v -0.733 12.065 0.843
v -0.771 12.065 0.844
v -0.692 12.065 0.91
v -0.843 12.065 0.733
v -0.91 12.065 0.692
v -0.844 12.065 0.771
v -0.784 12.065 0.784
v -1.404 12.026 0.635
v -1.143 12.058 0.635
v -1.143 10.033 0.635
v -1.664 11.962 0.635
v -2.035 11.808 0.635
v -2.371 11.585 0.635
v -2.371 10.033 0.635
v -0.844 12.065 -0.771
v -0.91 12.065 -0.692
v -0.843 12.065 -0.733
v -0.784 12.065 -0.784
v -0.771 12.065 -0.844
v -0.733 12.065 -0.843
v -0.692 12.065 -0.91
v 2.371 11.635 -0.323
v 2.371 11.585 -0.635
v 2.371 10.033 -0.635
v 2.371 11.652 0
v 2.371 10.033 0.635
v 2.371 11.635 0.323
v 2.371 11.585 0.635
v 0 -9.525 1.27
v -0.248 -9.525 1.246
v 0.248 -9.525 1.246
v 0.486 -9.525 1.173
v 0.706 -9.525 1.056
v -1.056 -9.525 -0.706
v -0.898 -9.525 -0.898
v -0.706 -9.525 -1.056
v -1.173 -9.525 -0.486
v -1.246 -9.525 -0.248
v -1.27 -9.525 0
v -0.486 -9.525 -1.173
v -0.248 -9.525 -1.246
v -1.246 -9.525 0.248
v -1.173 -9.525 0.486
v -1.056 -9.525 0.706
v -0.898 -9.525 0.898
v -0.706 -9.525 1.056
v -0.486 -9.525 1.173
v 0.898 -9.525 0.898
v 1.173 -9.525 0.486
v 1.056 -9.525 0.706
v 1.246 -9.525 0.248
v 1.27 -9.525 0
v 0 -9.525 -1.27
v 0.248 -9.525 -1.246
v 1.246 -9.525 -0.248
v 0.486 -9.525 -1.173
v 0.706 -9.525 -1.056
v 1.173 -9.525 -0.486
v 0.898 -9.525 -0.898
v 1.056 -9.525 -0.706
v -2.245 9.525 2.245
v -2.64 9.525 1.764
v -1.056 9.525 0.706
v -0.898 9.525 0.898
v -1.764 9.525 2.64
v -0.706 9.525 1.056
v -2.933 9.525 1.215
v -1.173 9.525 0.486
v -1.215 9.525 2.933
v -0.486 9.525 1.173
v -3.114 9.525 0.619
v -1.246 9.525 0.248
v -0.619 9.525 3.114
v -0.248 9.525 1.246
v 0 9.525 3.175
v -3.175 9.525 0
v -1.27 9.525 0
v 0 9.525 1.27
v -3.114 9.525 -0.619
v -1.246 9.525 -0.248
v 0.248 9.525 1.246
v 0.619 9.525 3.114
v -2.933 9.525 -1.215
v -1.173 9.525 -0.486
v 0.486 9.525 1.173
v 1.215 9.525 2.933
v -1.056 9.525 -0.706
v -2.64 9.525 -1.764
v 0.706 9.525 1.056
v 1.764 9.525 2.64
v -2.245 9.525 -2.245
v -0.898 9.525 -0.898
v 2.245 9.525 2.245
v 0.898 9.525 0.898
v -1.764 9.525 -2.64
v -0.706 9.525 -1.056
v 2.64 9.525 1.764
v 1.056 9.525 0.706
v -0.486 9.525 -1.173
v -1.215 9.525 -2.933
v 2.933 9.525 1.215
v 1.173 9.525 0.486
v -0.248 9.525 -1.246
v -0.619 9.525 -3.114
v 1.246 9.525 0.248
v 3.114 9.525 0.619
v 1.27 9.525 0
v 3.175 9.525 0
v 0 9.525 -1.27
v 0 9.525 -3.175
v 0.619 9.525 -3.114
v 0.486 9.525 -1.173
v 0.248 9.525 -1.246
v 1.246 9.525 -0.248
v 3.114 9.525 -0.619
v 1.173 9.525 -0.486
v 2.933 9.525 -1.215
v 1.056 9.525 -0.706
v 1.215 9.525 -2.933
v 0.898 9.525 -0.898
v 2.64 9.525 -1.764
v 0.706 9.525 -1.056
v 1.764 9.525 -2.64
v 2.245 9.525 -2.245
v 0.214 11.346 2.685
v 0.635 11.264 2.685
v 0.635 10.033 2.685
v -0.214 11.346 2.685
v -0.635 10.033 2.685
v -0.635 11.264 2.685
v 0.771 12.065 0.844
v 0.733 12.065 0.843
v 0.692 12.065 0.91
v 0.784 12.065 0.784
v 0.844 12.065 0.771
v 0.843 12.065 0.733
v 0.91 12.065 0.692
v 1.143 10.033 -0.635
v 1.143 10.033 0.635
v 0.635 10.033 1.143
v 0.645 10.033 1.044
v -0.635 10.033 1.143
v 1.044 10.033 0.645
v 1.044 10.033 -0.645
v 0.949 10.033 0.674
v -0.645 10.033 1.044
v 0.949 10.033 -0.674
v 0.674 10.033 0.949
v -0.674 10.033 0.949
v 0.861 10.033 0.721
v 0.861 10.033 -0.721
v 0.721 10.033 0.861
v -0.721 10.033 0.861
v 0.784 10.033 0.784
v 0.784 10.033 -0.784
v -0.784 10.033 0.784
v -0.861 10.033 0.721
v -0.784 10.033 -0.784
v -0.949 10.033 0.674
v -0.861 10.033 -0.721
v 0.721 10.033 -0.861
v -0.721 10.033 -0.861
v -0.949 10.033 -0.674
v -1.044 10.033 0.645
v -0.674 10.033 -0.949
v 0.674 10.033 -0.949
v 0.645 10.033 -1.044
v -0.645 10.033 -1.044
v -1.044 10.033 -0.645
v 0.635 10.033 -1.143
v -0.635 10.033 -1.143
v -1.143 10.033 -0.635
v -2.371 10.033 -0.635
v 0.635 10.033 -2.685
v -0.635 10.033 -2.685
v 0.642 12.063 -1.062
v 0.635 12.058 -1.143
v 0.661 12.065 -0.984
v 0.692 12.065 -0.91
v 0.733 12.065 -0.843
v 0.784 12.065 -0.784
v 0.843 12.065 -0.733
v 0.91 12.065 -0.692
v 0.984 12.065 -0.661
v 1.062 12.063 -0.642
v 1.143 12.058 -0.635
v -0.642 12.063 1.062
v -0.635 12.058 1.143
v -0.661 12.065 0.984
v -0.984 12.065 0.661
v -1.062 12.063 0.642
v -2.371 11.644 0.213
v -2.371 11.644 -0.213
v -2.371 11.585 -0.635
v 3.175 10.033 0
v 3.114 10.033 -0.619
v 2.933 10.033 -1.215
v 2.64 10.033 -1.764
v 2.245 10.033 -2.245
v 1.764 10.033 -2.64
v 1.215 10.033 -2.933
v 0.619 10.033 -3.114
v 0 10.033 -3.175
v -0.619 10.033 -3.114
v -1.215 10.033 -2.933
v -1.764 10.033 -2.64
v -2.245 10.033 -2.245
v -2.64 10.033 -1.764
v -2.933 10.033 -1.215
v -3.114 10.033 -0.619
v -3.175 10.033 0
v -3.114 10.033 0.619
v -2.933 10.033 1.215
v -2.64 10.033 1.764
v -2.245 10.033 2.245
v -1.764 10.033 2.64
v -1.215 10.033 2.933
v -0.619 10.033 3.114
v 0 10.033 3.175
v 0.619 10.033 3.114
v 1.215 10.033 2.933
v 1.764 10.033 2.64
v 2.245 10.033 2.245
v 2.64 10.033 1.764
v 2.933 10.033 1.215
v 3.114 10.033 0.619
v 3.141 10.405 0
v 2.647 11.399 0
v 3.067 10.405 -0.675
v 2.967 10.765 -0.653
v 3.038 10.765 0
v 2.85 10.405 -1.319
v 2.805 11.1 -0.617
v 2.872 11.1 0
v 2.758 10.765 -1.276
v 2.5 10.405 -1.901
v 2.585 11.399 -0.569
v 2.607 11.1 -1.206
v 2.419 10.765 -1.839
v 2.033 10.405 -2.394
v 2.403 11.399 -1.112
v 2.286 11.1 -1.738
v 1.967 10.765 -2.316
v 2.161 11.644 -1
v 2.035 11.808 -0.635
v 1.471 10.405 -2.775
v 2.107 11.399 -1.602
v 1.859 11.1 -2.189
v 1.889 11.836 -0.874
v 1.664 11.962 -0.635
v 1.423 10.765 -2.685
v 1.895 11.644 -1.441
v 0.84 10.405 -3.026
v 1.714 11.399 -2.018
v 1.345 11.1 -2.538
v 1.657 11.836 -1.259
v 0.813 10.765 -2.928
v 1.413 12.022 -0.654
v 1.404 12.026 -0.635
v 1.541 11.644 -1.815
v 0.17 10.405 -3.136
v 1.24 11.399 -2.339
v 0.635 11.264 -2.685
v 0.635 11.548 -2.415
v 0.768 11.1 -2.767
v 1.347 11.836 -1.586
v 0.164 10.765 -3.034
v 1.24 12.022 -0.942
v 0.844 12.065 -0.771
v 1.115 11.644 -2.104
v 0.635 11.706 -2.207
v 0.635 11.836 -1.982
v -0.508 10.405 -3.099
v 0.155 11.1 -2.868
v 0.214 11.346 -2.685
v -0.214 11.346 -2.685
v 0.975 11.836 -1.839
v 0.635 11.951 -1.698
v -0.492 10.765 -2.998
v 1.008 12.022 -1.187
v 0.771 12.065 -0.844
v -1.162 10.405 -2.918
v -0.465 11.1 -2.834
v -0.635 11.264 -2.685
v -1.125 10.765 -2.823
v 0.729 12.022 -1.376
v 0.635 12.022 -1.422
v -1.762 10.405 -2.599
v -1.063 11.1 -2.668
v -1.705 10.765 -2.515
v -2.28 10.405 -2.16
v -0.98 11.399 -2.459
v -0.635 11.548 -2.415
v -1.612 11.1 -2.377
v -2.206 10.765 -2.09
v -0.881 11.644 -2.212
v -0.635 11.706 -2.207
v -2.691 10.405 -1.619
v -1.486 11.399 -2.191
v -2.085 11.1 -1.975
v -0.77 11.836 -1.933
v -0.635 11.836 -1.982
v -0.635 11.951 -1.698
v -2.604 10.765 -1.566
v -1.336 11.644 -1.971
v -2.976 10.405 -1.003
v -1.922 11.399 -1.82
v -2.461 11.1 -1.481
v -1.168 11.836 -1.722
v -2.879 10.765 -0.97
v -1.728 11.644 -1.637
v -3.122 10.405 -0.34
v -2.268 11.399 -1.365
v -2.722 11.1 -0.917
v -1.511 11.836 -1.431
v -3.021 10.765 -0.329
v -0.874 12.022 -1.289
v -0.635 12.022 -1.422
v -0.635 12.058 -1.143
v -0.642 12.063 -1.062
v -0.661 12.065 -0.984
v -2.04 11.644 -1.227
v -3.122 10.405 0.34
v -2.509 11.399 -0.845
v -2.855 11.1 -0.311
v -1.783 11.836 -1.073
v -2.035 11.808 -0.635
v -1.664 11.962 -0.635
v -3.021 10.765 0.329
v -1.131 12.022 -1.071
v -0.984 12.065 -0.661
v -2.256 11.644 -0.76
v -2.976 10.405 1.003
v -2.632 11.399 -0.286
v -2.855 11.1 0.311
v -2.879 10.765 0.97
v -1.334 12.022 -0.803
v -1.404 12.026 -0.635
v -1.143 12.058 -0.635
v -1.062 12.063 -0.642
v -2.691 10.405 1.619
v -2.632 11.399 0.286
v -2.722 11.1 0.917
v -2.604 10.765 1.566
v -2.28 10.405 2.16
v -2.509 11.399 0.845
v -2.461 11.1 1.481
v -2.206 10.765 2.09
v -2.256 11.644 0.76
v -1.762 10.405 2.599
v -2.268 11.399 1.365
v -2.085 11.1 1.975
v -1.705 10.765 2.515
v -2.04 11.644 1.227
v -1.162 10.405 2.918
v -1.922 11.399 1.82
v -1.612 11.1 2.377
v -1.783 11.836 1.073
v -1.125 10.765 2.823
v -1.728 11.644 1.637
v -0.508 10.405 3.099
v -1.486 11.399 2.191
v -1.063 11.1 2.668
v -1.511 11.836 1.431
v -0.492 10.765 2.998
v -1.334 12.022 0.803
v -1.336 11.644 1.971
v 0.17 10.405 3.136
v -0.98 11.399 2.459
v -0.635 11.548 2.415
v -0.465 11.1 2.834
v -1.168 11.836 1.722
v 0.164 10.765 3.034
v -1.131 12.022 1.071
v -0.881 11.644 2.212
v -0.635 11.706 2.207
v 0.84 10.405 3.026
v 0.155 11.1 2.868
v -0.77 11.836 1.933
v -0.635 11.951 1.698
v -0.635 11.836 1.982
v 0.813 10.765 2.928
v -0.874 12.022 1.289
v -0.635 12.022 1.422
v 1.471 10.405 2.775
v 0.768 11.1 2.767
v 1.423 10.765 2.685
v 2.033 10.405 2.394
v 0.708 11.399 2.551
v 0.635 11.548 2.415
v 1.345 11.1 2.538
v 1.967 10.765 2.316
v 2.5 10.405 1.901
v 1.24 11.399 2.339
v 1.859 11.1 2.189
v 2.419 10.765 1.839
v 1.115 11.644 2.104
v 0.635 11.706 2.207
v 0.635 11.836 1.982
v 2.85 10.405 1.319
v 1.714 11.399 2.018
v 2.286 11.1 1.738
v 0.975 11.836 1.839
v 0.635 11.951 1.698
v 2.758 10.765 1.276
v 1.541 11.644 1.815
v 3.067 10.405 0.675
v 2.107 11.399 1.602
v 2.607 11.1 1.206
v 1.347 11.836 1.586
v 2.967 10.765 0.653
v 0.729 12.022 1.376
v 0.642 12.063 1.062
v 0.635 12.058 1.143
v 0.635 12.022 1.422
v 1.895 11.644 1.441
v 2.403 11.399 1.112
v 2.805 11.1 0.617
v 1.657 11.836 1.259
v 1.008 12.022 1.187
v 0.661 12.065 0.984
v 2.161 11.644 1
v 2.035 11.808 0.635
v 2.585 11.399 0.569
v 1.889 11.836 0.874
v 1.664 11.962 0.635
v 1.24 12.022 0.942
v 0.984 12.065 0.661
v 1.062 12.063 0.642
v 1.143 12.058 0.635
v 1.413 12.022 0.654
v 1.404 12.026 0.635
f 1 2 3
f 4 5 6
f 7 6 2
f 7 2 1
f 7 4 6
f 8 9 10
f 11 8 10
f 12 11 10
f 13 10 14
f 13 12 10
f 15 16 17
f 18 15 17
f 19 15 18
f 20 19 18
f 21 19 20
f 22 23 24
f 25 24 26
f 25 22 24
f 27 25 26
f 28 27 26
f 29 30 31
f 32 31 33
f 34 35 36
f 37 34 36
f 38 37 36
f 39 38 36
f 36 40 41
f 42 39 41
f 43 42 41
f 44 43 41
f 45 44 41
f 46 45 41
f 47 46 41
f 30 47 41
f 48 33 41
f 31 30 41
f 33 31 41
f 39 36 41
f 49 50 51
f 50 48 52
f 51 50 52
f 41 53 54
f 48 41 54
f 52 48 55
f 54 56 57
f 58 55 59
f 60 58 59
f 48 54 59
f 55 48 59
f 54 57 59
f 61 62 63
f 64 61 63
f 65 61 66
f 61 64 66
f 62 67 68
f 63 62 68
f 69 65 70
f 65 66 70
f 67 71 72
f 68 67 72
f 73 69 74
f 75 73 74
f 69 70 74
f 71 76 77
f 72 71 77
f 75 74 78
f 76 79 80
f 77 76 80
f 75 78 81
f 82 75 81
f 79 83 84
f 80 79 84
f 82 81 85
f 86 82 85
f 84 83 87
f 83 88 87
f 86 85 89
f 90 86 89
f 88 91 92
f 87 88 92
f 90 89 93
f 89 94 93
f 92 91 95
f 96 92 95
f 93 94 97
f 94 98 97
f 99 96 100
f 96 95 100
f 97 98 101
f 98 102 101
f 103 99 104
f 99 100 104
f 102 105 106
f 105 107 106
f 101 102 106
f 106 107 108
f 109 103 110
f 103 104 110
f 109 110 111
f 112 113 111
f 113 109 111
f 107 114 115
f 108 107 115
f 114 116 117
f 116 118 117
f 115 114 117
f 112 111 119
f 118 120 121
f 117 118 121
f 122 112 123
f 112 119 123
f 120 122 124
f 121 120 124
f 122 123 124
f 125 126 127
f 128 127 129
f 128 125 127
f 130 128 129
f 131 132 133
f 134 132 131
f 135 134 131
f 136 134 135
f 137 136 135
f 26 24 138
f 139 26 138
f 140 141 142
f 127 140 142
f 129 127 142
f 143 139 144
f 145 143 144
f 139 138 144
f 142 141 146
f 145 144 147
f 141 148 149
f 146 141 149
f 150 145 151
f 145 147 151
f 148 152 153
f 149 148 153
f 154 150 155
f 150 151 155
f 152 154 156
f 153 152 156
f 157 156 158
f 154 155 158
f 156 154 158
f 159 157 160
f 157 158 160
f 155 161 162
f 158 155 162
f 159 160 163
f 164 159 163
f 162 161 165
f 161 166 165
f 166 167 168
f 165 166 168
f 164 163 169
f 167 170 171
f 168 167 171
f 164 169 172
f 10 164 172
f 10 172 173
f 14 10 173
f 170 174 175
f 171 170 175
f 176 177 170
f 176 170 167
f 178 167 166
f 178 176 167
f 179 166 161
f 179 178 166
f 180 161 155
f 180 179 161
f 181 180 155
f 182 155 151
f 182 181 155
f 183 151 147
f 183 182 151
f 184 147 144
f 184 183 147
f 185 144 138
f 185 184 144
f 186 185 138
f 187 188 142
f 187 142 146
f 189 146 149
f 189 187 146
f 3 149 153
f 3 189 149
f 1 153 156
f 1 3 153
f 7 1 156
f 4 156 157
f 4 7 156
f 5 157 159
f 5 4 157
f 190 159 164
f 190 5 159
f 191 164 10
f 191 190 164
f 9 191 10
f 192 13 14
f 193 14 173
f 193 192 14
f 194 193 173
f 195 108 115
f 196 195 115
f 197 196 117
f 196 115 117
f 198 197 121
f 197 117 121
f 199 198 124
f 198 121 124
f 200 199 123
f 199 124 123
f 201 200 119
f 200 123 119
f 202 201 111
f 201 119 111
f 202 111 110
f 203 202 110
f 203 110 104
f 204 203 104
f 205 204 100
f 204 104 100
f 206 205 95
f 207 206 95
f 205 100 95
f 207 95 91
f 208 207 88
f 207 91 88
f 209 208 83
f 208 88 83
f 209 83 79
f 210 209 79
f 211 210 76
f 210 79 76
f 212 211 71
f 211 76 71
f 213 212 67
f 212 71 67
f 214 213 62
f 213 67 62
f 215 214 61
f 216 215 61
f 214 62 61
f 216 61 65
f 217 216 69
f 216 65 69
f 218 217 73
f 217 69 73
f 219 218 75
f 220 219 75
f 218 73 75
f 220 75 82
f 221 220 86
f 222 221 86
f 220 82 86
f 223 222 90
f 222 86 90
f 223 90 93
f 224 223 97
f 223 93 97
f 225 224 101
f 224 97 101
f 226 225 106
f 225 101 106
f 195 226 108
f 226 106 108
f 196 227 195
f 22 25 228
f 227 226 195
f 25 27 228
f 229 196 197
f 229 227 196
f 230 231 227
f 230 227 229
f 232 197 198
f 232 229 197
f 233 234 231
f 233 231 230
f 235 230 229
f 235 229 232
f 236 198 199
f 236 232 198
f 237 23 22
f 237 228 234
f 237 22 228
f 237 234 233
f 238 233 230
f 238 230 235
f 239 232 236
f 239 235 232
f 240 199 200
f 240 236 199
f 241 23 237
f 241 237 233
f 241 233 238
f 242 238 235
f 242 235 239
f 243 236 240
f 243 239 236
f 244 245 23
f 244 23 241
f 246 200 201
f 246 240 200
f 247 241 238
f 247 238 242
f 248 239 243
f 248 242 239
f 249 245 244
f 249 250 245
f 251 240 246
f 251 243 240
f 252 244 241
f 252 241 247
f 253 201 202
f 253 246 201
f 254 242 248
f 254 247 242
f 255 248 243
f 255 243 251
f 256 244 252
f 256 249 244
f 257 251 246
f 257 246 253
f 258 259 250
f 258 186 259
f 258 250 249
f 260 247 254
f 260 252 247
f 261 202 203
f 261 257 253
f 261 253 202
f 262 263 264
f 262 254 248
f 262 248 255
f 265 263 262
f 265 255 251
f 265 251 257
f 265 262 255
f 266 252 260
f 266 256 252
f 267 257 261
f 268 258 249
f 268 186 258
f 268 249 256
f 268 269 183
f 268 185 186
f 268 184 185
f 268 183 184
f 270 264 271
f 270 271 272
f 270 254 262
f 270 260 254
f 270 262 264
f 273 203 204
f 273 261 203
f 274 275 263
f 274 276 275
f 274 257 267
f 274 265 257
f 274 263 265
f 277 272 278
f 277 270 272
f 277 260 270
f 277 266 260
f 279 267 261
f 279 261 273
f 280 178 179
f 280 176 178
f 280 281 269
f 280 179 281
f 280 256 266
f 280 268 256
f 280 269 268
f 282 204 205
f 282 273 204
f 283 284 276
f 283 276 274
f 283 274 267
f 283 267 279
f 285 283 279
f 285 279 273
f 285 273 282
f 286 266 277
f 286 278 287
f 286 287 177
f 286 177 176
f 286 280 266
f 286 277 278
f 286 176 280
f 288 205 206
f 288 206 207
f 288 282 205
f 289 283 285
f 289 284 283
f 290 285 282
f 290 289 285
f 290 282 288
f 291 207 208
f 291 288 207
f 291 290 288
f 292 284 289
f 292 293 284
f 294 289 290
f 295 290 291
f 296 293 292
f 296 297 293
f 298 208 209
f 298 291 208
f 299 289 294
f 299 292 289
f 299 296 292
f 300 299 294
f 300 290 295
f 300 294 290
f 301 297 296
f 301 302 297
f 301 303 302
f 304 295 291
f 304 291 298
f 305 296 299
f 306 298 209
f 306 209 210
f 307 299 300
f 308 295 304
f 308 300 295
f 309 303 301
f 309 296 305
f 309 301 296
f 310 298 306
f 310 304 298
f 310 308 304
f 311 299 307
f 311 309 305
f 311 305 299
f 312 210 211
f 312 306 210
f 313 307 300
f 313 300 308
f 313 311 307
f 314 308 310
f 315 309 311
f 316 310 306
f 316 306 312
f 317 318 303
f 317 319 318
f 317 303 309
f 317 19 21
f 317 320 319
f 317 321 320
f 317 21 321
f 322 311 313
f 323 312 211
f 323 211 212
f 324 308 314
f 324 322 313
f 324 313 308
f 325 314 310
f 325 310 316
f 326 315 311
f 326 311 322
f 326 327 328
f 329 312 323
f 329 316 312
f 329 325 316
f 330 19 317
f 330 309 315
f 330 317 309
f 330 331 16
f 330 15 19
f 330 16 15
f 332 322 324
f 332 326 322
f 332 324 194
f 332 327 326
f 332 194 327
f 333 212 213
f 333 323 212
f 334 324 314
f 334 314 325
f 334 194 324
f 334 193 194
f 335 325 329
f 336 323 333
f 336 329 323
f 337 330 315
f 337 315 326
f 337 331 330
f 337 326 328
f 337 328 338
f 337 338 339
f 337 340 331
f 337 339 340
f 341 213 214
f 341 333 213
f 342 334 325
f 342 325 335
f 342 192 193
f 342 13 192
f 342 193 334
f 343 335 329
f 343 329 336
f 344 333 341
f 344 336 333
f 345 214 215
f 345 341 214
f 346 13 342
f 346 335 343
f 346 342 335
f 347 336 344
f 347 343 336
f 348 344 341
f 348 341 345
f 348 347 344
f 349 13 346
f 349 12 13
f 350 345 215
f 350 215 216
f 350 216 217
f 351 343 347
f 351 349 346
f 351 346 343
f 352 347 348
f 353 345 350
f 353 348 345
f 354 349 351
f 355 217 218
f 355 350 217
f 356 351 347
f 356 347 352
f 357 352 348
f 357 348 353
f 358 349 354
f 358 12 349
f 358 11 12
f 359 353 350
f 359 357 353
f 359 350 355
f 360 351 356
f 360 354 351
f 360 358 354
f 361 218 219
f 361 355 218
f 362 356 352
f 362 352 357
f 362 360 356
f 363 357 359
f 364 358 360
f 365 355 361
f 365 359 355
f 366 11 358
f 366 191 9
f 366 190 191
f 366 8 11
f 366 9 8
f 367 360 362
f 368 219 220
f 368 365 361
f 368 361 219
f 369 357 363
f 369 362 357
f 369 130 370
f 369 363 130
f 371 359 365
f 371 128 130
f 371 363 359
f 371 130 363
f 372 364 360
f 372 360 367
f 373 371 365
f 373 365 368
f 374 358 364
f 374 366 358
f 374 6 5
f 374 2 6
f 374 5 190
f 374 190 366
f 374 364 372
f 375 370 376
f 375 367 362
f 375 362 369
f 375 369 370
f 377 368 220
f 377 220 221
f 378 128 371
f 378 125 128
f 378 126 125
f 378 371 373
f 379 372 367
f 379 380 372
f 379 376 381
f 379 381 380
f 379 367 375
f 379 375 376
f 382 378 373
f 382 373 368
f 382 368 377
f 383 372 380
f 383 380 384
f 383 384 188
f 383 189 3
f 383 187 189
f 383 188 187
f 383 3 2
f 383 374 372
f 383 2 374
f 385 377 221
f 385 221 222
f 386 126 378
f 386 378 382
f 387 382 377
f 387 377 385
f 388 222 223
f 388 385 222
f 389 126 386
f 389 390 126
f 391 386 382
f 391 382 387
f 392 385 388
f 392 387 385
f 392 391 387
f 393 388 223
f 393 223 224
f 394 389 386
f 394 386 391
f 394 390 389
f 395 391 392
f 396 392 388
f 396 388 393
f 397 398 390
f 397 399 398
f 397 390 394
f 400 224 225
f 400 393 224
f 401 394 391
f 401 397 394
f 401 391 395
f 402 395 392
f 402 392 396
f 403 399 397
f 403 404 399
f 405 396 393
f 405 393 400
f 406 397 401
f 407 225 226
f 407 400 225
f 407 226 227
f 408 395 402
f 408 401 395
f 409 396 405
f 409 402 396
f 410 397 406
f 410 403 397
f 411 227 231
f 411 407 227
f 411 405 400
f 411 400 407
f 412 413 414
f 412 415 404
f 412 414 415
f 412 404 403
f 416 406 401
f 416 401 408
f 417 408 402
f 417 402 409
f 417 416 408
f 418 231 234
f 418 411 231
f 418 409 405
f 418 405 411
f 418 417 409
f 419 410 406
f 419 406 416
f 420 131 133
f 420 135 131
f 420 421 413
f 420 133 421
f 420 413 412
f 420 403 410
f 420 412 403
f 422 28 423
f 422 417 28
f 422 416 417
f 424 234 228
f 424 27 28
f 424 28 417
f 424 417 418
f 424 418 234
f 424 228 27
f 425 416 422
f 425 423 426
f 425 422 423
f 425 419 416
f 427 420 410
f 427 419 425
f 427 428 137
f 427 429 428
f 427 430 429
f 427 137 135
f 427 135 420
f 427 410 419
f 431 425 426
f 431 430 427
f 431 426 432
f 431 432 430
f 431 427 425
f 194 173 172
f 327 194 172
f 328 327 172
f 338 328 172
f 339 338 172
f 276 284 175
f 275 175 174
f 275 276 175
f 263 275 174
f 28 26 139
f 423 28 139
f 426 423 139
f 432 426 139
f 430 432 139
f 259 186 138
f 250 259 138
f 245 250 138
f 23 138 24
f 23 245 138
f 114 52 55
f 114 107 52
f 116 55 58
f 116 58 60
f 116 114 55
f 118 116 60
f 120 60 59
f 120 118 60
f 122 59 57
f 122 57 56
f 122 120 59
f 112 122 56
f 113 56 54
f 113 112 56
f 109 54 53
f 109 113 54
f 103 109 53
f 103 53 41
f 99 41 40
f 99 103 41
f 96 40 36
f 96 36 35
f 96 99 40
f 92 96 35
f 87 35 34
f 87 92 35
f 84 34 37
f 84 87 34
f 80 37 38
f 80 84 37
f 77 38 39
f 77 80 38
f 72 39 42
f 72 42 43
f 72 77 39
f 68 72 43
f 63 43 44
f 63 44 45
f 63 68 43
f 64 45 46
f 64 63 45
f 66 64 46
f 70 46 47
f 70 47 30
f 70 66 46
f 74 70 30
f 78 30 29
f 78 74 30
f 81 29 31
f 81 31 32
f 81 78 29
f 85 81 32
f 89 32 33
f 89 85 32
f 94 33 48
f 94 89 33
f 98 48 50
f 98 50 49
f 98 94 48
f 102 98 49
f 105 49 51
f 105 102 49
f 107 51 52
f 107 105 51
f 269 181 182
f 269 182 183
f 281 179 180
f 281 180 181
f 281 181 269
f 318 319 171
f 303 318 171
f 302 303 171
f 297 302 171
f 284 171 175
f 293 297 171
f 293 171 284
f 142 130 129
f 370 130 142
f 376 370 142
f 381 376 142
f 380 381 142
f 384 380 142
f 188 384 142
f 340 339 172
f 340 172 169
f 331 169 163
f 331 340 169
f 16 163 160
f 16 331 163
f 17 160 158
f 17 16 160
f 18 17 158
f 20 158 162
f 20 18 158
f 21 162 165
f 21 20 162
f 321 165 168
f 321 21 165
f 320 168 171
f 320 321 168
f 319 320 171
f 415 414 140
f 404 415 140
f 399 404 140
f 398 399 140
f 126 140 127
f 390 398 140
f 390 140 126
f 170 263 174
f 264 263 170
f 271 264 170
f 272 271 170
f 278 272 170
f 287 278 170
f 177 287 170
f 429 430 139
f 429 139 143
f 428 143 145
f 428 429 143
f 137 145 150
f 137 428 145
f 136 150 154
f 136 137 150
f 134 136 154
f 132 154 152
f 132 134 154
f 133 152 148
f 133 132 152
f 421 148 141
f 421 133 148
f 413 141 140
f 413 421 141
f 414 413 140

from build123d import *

# Parameters (mm, degrees)
SKETCH1_R           = 1.27
BOSS_EXTRUDE1_DEPTH = 9.525
SKETCH2_R           = 3.175
BOSS_EXTRUDE2_DEPTH = 2.54
FILLET1_R           = 2.032
CUT_EXTRUDE1_DEPTH  = 2.032


with BuildPart() as part:
    # Sketch1 → Boss-Extrude1 (new body, symmetric)
    with BuildSketch(Plane(origin=(0, 0, 0), x_dir=(1, 0, 0), z_dir=(0, 1, 0))):
        Circle(SKETCH1_R)
    extrude(amount=BOSS_EXTRUDE1_DEPTH, both=True)

    # Sketch2 → Boss-Extrude2 (add)
    with BuildSketch(Plane(origin=(0, 9.525, 0), x_dir=(1, 0, 0), z_dir=(0, 1, 0))):
        Circle(SKETCH2_R)
    extrude(amount=BOSS_EXTRUDE2_DEPTH)

    # Fillet1
    fillet1_edges = [part.edges().sort_by_distance(p)[0] for p in [
        (-3.175, 12.065, 0),
    ]]
    fillet(fillet1_edges, radius=FILLET1_R)

    # Sketch3 → Cut-Extrude1 (cut)
    with BuildSketch(Plane(origin=(0, 12.065, 0), x_dir=(1, 0, 0), z_dir=(0, 1, 0))):
        with BuildLine():
            Line((-0.635, 1.143), (-0.635, 2.685389765))
            Line((-0.635, 2.685389765), (0.635, 2.685389765))
            Line((0.635, 2.685389765), (0.635, 1.143))
            ThreePointArc((0.635, 1.143), (0.783789755, 0.783789755), (1.143, 0.635))
            Line((1.143, 0.635), (2.371299226, 0.635))
            Line((2.371299226, 0.635), (2.371299226, -0.635))
            Line((2.371299226, -0.635), (1.143, -0.635))
            ThreePointArc((1.143, -0.635), (0.783789755, -0.783789755), (0.635, -1.143))
            Line((0.635, -1.143), (0.635, -2.685389765))
            Line((0.635, -2.685389765), (-0.635, -2.685389765))
            Line((-0.635, -2.685389765), (-0.635, -1.143))
            ThreePointArc((-0.635, -1.143), (-0.783789755, -0.783789755), (-1.143, -0.635))
            Line((-1.143, -0.635), (-2.371299226, -0.635))
            Line((-2.371299226, -0.635), (-2.371299226, 0.635))
            Line((-2.371299226, 0.635), (-1.143, 0.635))
            ThreePointArc((-1.143, 0.635), (-0.783789755, 0.783789755), (-0.635, 1.143))
        make_face()
    extrude(amount=-CUT_EXTRUDE1_DEPTH, mode=Mode.SUBTRACT)


solid = part.part
